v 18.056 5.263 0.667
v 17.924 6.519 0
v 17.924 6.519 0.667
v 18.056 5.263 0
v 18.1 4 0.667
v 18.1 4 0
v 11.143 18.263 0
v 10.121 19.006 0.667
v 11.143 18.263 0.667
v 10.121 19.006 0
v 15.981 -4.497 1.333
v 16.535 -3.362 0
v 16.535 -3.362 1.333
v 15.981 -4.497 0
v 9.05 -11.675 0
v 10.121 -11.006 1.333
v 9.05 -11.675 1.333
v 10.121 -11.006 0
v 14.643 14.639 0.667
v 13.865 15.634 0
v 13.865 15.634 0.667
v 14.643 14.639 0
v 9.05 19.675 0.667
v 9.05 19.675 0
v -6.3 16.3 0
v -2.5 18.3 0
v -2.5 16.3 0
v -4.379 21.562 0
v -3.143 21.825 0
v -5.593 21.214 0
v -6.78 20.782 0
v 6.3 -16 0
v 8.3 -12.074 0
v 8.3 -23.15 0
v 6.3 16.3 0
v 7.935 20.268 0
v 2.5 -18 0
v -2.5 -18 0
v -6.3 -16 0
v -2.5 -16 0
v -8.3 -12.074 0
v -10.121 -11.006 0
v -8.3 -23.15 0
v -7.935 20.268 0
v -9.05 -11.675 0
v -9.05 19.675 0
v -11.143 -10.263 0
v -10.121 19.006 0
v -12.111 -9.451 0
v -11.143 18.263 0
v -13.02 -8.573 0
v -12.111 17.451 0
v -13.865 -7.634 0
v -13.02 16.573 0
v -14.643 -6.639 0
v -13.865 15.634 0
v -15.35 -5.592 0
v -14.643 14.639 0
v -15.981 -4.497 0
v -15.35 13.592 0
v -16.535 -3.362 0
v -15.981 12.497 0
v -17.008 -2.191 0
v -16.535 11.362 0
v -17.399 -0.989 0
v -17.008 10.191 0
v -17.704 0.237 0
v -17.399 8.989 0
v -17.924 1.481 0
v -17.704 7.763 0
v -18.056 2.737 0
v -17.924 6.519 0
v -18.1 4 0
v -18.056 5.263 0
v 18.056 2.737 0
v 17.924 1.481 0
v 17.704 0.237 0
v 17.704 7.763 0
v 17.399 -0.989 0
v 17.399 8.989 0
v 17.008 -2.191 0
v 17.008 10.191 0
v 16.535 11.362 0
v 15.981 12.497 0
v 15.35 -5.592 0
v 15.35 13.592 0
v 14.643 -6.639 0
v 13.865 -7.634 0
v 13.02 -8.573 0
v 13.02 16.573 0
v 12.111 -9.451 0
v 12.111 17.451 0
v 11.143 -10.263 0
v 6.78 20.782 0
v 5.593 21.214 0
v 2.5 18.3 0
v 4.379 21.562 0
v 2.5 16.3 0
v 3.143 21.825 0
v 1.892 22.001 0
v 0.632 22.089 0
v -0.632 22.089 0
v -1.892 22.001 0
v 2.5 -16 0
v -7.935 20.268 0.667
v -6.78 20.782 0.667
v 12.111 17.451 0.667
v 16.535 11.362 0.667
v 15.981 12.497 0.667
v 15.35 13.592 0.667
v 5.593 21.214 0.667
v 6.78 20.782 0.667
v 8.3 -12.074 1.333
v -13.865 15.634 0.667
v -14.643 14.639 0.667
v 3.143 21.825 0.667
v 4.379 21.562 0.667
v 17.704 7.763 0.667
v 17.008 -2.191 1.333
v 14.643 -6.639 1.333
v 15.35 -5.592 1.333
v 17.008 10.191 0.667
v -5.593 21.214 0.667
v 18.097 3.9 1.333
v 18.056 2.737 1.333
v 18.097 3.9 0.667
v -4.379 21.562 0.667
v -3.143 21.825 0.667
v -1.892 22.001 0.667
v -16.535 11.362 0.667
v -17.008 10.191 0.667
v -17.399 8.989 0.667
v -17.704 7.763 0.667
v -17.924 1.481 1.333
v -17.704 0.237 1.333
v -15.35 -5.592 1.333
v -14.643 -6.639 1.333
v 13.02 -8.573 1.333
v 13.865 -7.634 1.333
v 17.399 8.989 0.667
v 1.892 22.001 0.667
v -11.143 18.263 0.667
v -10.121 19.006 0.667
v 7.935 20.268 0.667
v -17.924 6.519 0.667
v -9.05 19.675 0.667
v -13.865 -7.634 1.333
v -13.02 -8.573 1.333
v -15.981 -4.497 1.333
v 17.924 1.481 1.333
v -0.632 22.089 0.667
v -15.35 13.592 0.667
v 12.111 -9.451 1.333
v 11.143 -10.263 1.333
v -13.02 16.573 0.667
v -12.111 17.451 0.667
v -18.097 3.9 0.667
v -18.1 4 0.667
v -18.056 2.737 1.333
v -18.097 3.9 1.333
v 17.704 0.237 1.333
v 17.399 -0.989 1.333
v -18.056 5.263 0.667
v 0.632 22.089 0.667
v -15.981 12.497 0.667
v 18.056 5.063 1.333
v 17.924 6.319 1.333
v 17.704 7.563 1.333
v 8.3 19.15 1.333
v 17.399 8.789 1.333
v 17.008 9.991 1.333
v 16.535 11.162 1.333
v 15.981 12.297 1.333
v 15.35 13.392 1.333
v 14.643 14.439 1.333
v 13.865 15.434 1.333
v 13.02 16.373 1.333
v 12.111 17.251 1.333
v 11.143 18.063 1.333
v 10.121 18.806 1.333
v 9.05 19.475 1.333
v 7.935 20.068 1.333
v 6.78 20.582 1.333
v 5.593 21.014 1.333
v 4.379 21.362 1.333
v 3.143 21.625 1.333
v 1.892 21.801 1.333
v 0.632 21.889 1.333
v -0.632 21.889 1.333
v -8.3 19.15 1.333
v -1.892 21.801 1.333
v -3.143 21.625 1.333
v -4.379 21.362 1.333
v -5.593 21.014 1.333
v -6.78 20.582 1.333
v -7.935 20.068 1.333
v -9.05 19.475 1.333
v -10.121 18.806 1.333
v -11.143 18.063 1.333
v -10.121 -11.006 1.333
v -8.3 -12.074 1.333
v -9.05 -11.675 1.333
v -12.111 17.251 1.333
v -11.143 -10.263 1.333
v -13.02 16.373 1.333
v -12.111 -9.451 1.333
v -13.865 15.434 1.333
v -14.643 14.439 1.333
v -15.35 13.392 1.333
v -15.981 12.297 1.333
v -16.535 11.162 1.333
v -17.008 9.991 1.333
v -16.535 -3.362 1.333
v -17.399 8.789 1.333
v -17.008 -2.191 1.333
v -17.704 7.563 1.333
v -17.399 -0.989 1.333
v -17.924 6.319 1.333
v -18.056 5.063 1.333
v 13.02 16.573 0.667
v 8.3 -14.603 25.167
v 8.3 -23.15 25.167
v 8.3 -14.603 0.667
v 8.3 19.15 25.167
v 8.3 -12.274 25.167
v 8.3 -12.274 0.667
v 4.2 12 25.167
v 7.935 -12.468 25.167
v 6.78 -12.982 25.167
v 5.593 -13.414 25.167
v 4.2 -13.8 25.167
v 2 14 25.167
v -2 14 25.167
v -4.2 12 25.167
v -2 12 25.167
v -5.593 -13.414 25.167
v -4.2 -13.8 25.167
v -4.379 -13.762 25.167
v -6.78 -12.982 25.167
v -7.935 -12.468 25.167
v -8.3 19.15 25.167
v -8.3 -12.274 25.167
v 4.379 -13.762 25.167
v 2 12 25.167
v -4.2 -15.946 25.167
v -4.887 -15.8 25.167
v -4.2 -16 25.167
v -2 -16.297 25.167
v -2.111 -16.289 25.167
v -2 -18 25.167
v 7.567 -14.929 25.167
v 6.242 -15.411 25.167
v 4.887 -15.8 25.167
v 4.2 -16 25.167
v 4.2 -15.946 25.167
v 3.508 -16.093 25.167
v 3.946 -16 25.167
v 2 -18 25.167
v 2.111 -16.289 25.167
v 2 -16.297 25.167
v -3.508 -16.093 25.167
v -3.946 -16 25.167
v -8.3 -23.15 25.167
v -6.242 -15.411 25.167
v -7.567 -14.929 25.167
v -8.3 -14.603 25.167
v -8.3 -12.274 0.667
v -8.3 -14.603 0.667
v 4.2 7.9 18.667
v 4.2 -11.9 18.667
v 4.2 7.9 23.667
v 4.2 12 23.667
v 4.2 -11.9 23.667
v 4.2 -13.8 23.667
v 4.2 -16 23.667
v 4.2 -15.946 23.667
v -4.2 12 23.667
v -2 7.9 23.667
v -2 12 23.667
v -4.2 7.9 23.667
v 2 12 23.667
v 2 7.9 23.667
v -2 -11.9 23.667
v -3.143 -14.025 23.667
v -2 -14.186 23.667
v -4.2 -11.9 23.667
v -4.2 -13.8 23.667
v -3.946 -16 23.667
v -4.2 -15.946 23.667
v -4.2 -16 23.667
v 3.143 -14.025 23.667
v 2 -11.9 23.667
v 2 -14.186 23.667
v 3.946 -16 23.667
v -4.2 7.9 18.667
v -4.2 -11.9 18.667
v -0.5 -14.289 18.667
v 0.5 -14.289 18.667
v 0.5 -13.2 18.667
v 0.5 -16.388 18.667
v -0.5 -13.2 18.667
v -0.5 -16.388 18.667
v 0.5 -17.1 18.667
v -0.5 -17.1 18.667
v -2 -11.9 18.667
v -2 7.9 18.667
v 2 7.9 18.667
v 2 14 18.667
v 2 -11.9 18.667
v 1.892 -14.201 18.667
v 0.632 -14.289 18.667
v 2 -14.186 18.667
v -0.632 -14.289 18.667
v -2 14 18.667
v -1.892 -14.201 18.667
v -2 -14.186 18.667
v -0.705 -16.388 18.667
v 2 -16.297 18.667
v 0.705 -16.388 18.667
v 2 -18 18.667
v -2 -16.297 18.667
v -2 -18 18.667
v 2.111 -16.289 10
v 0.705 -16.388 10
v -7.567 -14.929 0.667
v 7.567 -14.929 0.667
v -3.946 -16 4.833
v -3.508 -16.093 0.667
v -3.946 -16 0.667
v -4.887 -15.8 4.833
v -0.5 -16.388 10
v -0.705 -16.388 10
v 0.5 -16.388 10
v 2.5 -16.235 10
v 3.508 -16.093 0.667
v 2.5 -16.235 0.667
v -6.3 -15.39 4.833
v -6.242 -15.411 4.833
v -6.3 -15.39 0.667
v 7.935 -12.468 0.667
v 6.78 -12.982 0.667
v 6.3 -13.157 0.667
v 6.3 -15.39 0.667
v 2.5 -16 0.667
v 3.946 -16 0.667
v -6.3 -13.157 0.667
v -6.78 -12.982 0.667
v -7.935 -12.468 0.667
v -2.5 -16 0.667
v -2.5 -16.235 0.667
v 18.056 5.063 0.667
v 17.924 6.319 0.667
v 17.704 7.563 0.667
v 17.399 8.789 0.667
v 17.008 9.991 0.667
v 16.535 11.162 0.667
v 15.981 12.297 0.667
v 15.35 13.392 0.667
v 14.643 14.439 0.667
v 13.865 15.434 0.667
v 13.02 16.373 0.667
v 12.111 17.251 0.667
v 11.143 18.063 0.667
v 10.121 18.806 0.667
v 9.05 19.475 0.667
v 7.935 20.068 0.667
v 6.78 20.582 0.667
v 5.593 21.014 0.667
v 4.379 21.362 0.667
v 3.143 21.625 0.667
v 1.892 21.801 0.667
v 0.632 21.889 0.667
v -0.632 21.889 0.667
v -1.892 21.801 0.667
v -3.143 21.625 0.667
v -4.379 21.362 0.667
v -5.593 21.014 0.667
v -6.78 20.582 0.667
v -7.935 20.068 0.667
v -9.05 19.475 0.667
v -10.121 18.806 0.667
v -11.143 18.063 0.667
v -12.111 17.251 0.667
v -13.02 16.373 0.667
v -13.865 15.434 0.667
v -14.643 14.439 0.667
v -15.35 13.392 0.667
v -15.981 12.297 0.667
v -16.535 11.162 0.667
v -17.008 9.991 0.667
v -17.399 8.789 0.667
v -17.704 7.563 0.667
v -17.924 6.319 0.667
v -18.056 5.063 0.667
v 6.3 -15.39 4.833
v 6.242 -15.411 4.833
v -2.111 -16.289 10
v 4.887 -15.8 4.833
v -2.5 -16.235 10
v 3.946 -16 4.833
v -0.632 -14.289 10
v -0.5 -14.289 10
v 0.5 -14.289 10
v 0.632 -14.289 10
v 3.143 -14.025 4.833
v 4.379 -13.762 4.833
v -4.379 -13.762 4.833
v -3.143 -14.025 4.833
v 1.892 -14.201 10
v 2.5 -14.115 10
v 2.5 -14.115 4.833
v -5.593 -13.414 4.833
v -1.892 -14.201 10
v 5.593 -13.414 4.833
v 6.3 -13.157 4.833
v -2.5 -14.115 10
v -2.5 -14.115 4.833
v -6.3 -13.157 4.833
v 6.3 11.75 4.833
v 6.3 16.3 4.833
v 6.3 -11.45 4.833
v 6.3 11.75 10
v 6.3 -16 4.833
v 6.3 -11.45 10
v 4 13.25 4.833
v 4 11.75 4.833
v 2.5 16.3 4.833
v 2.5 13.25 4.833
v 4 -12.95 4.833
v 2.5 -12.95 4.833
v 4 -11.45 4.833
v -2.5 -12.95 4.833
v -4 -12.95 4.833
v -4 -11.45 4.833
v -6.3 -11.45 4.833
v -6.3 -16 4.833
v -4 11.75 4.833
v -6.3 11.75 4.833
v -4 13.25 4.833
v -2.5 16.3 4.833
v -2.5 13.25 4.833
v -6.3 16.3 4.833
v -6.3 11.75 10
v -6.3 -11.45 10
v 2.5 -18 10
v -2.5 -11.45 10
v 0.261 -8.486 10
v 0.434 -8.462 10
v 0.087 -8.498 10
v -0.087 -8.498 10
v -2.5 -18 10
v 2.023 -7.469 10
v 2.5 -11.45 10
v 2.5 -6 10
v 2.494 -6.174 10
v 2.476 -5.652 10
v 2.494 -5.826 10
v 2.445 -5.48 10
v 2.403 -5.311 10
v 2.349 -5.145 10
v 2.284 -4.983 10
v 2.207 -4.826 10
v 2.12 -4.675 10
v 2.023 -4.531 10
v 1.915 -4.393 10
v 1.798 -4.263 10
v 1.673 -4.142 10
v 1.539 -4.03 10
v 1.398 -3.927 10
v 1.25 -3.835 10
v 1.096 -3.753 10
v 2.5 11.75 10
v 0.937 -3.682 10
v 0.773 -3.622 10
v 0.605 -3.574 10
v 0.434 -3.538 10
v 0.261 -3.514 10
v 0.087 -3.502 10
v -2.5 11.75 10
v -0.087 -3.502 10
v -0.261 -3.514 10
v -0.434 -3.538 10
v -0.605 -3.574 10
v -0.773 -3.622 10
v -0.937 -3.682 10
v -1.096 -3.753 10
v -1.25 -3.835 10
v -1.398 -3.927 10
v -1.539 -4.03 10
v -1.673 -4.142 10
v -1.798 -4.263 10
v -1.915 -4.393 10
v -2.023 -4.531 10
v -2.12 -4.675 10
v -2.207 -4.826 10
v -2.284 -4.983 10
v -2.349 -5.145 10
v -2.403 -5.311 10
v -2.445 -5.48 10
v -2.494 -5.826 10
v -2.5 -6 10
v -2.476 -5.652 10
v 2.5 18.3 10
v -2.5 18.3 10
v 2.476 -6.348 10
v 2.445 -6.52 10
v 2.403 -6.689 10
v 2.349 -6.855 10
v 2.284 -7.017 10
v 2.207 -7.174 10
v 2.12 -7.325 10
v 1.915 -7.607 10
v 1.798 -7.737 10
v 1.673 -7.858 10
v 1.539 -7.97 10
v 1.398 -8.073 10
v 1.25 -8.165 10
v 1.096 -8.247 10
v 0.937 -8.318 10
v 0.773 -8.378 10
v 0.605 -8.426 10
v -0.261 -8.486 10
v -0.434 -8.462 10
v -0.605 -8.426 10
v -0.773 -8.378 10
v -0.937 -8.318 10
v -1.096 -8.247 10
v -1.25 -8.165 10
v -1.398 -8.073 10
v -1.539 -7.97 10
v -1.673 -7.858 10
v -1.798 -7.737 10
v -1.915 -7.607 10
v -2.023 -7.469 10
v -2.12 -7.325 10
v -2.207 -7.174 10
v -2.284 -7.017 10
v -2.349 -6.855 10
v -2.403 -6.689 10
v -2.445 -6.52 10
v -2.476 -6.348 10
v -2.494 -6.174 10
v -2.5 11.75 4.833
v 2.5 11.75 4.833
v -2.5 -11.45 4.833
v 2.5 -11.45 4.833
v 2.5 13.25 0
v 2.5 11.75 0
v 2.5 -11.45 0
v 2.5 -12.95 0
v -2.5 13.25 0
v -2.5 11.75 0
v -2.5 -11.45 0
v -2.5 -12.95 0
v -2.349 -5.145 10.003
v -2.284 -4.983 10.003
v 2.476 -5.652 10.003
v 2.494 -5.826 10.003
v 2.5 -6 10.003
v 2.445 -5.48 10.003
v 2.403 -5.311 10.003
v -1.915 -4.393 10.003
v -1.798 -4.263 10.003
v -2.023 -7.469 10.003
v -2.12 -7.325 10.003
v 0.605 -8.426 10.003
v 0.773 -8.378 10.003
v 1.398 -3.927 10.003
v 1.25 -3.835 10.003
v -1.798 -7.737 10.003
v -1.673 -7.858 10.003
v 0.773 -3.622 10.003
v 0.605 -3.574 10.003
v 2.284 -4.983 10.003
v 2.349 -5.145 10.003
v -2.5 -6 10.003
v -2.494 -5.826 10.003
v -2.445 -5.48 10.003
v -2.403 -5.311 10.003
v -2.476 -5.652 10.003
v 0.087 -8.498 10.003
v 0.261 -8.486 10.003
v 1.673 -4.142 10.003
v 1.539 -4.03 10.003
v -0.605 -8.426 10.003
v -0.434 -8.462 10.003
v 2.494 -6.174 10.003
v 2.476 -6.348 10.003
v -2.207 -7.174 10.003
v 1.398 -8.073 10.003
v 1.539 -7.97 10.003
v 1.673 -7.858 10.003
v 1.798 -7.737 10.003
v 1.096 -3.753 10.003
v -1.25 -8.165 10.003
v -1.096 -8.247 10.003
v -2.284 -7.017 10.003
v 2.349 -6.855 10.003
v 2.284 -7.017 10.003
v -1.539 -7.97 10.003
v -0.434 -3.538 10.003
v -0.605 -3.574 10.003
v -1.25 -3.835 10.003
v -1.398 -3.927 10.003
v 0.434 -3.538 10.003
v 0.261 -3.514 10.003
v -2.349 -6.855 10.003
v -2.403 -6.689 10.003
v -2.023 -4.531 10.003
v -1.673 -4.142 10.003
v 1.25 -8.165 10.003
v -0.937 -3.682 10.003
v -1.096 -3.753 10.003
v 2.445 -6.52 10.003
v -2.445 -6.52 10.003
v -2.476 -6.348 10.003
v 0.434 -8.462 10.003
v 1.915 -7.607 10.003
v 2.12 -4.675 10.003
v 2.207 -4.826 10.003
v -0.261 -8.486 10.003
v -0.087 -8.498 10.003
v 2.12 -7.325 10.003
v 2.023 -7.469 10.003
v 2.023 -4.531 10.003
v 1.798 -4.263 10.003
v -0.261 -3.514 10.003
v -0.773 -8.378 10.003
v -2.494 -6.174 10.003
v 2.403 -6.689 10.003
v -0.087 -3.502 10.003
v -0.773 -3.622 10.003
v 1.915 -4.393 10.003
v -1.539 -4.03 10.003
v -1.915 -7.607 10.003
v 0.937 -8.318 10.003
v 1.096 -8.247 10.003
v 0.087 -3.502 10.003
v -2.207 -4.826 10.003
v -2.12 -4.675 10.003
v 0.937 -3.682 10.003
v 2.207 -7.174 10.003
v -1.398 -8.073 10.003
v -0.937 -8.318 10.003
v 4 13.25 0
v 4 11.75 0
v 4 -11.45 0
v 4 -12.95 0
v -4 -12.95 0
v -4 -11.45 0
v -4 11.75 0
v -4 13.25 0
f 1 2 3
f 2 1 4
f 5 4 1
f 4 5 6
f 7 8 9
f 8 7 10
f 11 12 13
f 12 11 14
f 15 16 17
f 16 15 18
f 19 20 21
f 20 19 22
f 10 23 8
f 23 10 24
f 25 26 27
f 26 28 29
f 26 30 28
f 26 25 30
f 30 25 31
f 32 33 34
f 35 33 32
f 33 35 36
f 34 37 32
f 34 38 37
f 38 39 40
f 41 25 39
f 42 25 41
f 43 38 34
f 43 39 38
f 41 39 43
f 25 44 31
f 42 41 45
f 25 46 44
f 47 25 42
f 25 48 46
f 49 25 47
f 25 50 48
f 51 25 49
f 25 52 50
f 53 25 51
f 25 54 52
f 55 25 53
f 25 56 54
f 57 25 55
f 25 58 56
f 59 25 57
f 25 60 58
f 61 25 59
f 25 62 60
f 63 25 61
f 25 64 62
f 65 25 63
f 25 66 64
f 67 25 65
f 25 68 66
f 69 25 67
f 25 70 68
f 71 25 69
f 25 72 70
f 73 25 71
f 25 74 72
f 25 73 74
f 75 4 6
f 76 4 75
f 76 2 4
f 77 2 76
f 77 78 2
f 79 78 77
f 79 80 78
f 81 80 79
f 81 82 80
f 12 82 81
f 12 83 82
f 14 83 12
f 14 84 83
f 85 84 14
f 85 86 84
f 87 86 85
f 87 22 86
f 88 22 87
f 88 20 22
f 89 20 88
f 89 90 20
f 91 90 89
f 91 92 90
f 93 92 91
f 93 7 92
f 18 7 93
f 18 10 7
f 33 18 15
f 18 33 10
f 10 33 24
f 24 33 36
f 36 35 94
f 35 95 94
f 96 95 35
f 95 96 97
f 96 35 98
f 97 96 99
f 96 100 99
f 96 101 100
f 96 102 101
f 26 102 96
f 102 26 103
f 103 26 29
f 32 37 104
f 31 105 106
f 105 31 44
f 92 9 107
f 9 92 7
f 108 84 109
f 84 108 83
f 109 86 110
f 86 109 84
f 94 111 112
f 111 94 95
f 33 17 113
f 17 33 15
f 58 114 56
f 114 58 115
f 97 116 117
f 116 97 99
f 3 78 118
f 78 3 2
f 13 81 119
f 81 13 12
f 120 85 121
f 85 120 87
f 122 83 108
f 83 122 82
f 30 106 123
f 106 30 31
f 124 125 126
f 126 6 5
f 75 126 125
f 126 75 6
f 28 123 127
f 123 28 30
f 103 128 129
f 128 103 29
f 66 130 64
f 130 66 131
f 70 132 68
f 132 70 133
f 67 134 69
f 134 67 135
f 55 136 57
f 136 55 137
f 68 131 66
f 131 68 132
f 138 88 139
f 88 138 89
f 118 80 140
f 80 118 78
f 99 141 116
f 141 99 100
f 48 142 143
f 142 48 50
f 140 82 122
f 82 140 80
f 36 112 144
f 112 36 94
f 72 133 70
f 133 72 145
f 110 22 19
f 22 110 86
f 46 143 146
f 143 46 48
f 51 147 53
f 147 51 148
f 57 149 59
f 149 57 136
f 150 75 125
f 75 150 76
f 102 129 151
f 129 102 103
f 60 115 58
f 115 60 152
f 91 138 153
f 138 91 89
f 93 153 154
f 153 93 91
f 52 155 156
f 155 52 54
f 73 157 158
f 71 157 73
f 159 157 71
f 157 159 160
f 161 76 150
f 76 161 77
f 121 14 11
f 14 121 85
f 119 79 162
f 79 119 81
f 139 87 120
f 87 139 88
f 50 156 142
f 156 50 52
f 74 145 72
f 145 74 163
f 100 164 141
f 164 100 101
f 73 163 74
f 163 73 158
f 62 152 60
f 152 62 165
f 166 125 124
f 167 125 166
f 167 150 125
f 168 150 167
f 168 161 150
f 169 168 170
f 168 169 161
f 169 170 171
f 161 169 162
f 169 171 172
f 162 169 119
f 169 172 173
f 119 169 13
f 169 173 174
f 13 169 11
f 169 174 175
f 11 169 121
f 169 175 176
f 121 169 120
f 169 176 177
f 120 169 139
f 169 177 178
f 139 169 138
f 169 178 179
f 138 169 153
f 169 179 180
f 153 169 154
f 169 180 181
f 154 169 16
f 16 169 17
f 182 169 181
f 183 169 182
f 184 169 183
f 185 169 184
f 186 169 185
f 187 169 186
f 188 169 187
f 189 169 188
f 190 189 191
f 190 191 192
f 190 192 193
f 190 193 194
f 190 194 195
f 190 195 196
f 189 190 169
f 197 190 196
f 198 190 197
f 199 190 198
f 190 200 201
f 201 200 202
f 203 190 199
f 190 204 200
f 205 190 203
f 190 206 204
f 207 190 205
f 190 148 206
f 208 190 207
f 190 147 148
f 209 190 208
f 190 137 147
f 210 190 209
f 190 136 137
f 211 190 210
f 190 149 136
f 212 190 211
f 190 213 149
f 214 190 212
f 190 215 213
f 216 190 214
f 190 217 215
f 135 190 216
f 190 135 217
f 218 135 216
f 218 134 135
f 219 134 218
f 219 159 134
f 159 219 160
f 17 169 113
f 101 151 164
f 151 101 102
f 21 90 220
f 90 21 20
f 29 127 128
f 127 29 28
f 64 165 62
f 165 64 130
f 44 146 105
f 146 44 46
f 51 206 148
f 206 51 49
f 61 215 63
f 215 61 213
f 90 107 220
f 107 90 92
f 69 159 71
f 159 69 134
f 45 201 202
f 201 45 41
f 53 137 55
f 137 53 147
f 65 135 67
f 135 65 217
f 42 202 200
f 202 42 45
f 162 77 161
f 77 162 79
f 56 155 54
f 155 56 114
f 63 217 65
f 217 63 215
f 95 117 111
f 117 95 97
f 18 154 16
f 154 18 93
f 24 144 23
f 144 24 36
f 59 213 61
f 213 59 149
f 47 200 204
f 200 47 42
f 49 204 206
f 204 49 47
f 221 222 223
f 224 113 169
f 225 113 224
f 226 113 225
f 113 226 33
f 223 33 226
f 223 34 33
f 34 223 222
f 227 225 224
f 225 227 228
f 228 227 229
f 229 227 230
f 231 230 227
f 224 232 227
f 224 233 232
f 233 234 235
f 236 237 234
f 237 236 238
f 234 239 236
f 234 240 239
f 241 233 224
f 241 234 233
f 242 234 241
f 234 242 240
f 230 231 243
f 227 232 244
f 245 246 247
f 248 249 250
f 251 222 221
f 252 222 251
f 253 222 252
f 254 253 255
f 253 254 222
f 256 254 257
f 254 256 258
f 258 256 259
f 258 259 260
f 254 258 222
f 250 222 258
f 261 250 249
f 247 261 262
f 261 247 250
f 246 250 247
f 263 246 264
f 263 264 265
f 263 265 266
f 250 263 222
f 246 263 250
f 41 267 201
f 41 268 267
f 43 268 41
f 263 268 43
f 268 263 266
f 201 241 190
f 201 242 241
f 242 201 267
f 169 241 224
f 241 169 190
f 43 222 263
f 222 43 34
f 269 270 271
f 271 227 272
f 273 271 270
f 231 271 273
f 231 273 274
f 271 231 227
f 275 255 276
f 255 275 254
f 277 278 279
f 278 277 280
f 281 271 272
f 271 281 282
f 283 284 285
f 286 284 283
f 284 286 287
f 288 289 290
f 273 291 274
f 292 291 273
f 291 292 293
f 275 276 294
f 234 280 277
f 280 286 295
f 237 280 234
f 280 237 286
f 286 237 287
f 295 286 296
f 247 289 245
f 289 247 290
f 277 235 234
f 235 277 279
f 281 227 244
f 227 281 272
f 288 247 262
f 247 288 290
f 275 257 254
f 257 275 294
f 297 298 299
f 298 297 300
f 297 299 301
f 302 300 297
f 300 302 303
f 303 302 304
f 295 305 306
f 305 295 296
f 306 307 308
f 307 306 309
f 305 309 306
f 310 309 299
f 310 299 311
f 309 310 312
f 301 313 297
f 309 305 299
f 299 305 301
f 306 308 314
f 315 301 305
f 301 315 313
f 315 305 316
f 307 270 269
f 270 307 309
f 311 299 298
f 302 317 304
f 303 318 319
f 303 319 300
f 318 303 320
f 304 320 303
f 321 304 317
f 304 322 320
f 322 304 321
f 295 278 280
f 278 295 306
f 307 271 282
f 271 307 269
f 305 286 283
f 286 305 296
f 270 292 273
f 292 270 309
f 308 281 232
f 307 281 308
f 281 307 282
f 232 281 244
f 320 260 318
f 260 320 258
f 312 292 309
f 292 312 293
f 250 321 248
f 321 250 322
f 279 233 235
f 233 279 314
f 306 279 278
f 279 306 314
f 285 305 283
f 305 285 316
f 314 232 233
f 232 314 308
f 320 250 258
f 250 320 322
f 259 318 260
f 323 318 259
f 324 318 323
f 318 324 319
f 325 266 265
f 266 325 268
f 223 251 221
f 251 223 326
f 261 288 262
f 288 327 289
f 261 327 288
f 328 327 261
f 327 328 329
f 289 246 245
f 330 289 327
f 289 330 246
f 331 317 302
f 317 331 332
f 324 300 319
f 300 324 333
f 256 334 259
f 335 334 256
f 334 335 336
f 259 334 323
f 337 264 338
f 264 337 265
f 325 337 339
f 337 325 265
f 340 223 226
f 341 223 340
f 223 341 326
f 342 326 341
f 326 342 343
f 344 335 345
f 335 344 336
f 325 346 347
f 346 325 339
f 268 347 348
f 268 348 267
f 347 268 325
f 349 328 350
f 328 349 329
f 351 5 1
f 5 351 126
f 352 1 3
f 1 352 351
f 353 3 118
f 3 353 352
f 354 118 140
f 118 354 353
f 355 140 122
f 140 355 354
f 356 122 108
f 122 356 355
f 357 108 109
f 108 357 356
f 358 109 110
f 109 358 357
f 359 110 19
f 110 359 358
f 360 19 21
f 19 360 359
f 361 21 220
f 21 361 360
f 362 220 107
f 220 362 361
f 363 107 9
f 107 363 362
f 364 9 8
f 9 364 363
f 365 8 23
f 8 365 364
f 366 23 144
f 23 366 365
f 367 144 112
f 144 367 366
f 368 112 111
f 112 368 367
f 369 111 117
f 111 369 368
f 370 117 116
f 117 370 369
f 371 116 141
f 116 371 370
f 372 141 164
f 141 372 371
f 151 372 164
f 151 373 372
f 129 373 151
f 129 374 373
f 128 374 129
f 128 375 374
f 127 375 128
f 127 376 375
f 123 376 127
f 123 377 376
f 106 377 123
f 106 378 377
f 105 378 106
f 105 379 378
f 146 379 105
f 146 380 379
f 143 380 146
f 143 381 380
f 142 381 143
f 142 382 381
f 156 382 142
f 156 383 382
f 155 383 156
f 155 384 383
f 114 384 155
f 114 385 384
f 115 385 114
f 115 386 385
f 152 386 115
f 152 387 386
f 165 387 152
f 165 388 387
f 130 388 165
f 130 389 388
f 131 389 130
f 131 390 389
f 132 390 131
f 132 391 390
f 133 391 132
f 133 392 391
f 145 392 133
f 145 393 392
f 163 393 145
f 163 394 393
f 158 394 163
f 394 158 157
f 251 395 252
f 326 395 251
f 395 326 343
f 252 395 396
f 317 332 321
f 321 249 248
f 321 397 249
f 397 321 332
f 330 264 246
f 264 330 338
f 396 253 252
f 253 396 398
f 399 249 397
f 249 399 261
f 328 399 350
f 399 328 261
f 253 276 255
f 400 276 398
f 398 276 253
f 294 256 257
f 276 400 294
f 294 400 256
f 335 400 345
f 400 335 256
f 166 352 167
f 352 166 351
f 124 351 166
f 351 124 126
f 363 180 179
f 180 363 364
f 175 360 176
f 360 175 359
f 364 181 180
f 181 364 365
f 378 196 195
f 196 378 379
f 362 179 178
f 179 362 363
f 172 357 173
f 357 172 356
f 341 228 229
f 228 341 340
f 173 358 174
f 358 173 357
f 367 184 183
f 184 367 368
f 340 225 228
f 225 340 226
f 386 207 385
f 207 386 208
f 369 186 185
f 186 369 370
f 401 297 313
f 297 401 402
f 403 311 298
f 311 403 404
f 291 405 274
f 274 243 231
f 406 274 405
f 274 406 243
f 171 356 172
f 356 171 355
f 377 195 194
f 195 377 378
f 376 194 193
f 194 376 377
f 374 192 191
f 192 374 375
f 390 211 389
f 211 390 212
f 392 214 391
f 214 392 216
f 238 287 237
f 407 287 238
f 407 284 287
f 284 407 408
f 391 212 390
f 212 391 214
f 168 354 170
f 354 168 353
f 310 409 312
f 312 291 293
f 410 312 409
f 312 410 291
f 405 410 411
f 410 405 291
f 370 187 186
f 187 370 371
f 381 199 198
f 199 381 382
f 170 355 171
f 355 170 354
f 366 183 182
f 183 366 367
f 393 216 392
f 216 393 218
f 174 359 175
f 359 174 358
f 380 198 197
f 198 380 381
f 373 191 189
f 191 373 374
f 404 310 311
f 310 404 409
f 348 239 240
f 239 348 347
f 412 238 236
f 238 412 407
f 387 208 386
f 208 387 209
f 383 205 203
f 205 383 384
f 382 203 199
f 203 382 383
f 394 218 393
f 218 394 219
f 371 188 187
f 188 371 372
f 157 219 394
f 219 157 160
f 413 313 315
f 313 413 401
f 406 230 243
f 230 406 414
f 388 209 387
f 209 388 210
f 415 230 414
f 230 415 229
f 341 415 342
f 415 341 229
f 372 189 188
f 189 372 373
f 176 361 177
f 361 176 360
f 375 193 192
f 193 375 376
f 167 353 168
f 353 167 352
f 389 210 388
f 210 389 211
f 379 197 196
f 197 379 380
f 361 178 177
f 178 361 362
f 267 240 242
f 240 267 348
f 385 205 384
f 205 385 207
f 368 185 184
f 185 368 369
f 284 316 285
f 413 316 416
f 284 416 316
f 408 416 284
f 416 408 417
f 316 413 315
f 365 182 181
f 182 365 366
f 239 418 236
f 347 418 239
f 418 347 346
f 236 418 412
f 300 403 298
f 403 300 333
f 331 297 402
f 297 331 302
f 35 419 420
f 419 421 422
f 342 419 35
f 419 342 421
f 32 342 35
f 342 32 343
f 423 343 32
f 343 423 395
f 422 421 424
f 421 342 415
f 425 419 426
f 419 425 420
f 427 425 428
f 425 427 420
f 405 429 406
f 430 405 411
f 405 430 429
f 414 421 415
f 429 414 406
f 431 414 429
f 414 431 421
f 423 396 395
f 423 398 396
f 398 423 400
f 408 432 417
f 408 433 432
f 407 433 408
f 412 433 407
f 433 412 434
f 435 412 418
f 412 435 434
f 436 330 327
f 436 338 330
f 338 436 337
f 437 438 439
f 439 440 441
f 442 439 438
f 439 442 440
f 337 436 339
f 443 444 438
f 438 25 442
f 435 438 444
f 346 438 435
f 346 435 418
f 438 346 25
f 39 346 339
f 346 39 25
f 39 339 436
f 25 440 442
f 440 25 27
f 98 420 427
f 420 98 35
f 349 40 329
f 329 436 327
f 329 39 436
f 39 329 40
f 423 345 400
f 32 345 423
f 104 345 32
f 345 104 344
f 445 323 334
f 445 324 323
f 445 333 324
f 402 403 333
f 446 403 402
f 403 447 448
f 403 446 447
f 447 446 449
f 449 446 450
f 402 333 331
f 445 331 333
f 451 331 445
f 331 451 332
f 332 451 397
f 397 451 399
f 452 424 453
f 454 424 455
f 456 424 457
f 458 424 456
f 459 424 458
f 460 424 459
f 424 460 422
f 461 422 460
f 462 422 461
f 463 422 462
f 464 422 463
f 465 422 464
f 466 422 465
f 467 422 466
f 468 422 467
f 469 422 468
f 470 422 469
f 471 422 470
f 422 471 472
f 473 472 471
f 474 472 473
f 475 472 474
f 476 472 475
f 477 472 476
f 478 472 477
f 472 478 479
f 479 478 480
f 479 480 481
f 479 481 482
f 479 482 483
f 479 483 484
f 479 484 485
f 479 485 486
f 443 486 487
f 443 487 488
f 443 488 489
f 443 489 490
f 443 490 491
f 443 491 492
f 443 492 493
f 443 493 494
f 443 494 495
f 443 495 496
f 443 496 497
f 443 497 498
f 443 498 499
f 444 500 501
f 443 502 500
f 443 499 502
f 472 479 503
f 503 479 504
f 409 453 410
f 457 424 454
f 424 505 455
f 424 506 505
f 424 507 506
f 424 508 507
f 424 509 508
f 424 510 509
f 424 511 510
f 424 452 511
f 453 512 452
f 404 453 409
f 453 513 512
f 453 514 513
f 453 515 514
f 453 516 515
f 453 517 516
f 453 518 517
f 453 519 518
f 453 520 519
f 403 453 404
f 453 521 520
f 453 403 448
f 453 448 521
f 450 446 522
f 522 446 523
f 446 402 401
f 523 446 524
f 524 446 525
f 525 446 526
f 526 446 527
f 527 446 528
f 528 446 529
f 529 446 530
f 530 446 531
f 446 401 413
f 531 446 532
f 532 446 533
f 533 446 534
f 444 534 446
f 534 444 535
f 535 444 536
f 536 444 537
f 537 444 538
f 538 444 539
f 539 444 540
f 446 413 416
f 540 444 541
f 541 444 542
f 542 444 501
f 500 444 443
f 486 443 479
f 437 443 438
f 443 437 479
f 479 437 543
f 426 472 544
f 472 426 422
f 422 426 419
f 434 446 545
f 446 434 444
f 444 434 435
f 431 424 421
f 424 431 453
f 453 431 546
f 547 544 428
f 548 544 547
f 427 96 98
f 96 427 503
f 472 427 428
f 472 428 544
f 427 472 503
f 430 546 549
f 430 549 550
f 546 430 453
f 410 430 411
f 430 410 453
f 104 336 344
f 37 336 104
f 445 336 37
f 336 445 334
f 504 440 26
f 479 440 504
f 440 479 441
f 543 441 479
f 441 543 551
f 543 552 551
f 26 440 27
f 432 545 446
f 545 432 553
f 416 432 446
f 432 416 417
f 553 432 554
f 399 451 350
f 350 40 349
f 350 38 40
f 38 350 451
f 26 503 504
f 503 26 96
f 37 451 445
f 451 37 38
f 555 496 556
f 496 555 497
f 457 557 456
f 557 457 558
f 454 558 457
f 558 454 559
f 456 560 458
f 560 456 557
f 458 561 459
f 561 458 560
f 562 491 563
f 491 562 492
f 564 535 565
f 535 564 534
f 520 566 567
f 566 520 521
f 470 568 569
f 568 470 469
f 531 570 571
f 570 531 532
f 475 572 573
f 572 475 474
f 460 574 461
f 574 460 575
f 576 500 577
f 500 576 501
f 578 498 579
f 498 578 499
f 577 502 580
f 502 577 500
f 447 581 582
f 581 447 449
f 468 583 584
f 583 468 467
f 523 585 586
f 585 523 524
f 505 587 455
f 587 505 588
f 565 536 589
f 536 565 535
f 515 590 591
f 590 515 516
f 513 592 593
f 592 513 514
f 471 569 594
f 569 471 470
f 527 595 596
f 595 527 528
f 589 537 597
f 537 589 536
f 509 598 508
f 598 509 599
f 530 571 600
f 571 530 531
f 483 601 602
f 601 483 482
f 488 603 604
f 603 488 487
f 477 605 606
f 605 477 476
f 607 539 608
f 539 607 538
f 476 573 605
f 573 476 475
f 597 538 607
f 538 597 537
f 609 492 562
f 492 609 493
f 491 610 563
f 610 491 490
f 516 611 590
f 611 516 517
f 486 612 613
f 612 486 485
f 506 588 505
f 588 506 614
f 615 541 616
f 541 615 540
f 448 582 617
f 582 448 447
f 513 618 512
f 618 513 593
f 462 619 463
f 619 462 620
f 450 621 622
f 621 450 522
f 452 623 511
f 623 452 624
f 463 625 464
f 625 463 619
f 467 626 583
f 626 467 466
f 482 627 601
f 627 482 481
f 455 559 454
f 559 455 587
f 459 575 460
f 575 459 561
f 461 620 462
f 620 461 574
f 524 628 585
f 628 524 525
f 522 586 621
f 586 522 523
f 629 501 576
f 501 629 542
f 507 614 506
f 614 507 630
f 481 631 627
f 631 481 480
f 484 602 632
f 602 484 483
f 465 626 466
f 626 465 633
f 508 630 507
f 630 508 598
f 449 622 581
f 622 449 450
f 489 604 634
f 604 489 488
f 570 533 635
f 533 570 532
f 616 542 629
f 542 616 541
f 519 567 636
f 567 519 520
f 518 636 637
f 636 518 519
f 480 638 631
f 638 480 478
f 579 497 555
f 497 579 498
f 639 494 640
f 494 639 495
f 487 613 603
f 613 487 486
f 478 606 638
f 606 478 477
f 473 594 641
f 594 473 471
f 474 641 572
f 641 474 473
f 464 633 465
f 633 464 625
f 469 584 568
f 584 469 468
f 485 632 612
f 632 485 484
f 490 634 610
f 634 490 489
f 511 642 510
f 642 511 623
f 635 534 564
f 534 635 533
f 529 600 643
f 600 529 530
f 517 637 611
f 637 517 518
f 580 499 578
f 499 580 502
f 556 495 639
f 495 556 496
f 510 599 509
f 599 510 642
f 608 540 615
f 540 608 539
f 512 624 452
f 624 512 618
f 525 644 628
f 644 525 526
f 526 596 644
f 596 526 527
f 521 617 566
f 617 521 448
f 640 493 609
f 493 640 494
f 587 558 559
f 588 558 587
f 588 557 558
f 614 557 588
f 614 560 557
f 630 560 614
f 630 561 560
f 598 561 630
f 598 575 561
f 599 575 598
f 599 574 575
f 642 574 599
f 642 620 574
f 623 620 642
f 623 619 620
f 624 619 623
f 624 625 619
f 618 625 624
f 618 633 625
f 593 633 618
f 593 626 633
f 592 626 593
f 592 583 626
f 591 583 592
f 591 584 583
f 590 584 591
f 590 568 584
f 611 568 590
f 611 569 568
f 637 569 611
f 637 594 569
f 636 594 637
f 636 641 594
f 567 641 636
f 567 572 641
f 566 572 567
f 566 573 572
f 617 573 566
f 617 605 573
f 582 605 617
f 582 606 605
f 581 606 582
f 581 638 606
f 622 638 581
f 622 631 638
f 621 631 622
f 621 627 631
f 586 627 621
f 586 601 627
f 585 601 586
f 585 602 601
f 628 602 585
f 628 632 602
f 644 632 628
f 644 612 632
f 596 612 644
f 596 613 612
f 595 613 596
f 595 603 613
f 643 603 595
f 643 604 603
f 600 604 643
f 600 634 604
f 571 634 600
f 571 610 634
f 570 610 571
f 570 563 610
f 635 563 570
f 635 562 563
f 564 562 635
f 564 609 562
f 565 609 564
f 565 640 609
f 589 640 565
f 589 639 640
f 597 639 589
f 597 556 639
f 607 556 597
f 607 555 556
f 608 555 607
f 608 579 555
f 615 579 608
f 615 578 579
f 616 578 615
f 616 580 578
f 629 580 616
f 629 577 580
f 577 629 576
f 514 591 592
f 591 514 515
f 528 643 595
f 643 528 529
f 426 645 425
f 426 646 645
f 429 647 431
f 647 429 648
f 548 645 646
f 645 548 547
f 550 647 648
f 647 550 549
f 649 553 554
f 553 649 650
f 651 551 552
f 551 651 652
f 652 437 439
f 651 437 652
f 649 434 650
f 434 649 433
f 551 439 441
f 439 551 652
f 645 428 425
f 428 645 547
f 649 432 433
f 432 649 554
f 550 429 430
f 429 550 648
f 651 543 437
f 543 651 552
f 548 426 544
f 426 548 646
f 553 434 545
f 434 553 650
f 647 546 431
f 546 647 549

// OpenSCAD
$fn=90;
CROSS_CUT = false;

Z_SHRINK_FACTOR = 3;

TABS = [
    // top plate
    [1, 2, 3, 3, 2, 4, 4, 3, 1, 1],

    // middle plate
    [1, 2, 3, 3, 3, 3, 3, 2, 3, 3],

    // bottom plate
    [1, 2, 3, 4, 2, 4, 1, 2, 1, 2],
];

F = 0.5;
F = 1;

APART = false;

PLAY = 0.4;

ROTATION_STEP = 15; // degree

ENCODER_RADIUS = 20 - PLAY/2;

ENCODER_HEIGHT = 80 *F;
ENCODER_THICKNESS = 1.5 - PLAY/2;

ENCODER_ROTATION = -ROTATION_STEP * 10 * abs(sin($t*360));
//ENCODER_ROTATION = -ROTATION_STEP * 0;

TAB_VSIZE = 4 *F;
TAB_HSIZE = 3.5;
TAB_SPACING = 4.5 *F;

BODY_RADIUS = 25;
BODY_THICKNESS = 1;
BODY_WINDOW_MARGIN = 2;
BODY_MARGIN = 2;
BODY_GUIDE = 2; // <== TODO: Snapping ring
BODY_HEIGHT = ENCODER_HEIGHT + BODY_MARGIN;

SERVO1_HEIGHT = 26;
SERVO1_BODY_HEIGHT = 20;
SERVO1_BODY_WIDTH = 28;
SERVO1_BODY_WIDTH_CLEARANCE = 0; //2;
SERVO1_BODY_THICKNESS = 8.4;
SERVO1_BODY_THICKNESS_CLEARANCE = 4;
SERVO1_AXIS_SHIFT = 8 - SERVO1_BODY_WIDTH/2;
SERVO1_AXIS_RADIUS = 1.95;
SERVO1_CLEARANCE = 6.5;
SERVO1_HOLDER_HEIGHT = BODY_HEIGHT - SERVO1_CLEARANCE;
SERVO1_HOLDER_THICKNESS = 2;
SERVO1_BOTTOM_BODY_HEIGHT = 15;
SERVO1_BOTTOM_BODY_WIDTH = 19.8;

SERVO2_HEIGHT = 30;
SERVO2_BODY_HEIGHT = 22.5;
SERVO2_BODY_WIDTH = 32.3;
SERVO2_BODY_WIDTH_CLEARANCE = 0;
SERVO2_BODY_THICKNESS = 12.6;
SERVO2_BODY_THICKNESS_CLEARANCE = 5;
SERVO2_AXIS_SHIFT = SERVO2_BODY_WIDTH/2 -10;
SERVO2_AXIS_RADIUS = 2.5;
SERVO2_CLEARANCE = 12.5;
SERVO2_HOLDER_HEIGHT = BODY_HEIGHT - SERVO2_CLEARANCE;
SERVO2_HOLDER_THICKNESS = 2;
SERVO2_DISPLACEMENT = -7+1;
SERVO2_BOTTOM_BODY_HEIGHT = 15.5;
SERVO2_BOTTOM_BODY_WIDTH = 23.2;

ENCODER_DISPLACEMENT = BODY_RADIUS-ENCODER_RADIUS-BODY_THICKNESS -PLAY/2;

SUPPORT_THICKNESS = 1.5;

ATOM = 0.01;


module body_encoder_cavity() {
    translate([0, ENCODER_DISPLACEMENT, BODY_MARGIN])
    scale([1, 1, BODY_HEIGHT])
    cylinder(r=ENCODER_RADIUS+PLAY, h=1, true);
}

module body_window() {
    translate([0, 0, BODY_WINDOW_MARGIN + BODY_MARGIN])
    scale([1, 1, ENCODER_HEIGHT-BODY_WINDOW_MARGIN*2])
    translate([0, BODY_RADIUS, 0])
    cylinder(r=TAB_HSIZE/1.5, h=1, true);
}

module body_servo_holder() {
    translate([0, ENCODER_DISPLACEMENT, 0])
    servo_holder(max(SERVO1_BODY_WIDTH, SERVO2_BODY_WIDTH),
                 max(SERVO1_BODY_THICKNESS, SERVO2_BODY_THICKNESS));
}

module body_servo1_cavity() {
    translate([0, ENCODER_DISPLACEMENT, BODY_HEIGHT - SERVO1_HEIGHT]) {
        servo1_hull();
        servo1_hull2(BODY_HEIGHT);
    }
}

module body_encoder_border_cavity() {
    translate([0, ENCODER_DISPLACEMENT - PLAY/2, BODY_MARGIN])
    scale([1, 1, BODY_HEIGHT])
    difference() {
        cylinder(r=ENCODER_RADIUS+PLAY, h=1, true);
        cylinder(r=ENCODER_RADIUS-ENCODER_THICKNESS-PLAY, h=1, true);
    }
}

module body_spine() {
    spine_width = ENCODER_THICKNESS*3;
    if(1)
    translate([0, -ENCODER_RADIUS + ENCODER_DISPLACEMENT + ENCODER_THICKNESS/2, 0])
    scale([1, spine_width , BODY_HEIGHT - SERVO1_HEIGHT])
    translate([0, 0, 0.5])
    cube(1, true);                
}

module body_servo2_cavity() {
    translate([0, SERVO2_DISPLACEMENT, 0]) {
        servo2_hull();
    }        
}

module body_servo2_pillars() {
    translate([0, SERVO2_DISPLACEMENT, 0]) {
        servo2_pillars();
    }        
}

module body() {
    difference() {
        union() {
            difference() {
                union() {
                    %
                    difference() {
                        // body
                        scale([1, 1, BODY_HEIGHT])
                        cylinder(r=BODY_RADIUS, h=1, true);

                        body_encoder_cavity();
                        body_window();
                    }
                    body_servo_holder();
                }
                body_servo1_cavity();
                body_encoder_border_cavity();
            }
            body_spine();
        }
        body_servo2_cavity();
    }
    body_servo2_pillars();
}


module encoder() {
    rotate([0, 0, ENCODER_ROTATION])
    difference() {
        // body
        scale([1, 1, ENCODER_HEIGHT - PLAY])
        cylinder(r=ENCODER_RADIUS, h=1, true);

        // cavity
        encoder_cavity();

        // servo axis
        translate([0, 0, ENCODER_HEIGHT - SERVO1_HEIGHT])
        servo1_hull();

        // codes
        for (i=[0:9]) {
            top = TABS[0][i]+1;
            mid = TABS[1][i]+1;
            bot = TABS[2][i]+1;

            rotate([0, 0, 90 + ROTATION_STEP*i]) {
                translate([ENCODER_RADIUS, 0, ENCODER_HEIGHT/6*5 + TAB_SPACING*(top-3)])
                cube([TAB_HSIZE, TAB_HSIZE, TAB_VSIZE], true);

                translate([ENCODER_RADIUS, 0, ENCODER_HEIGHT/6*3 + TAB_SPACING*(mid-4)])
                cube([TAB_HSIZE, TAB_HSIZE, TAB_VSIZE], true);

                translate([ENCODER_RADIUS, 0, ENCODER_HEIGHT/6*1 + TAB_SPACING*(bot-4)])
                cube([TAB_HSIZE, TAB_HSIZE, TAB_VSIZE], true);
            }
        }
    }

}


module encoder_cavity() {
    // remove center
    translate([0, 0, -ATOM])
    scale([1, 1, ENCODER_HEIGHT-ENCODER_THICKNESS + ATOM*2])
    cylinder(r=ENCODER_RADIUS-ENCODER_THICKNESS, h=1, true);

    // remove quarter 1
    rotate([0, 0, -ROTATION_STEP*1.5])
    translate([0, -ATOM, -ATOM])
    scale([ENCODER_RADIUS*2, ENCODER_RADIUS*2+ATOM, ENCODER_HEIGHT-ENCODER_THICKNESS+ATOM*2])
    cube(1);

    // remove quarter 2
    rotate([0, 0, -ROTATION_STEP*7.5])
    translate([0, 0, -ATOM])
    scale([ENCODER_RADIUS*2, ENCODER_RADIUS*2, ENCODER_HEIGHT-ENCODER_THICKNESS+ATOM*2])
    cube(1);
}

module servo_holder(width, thickness) {
    union() {
        // guiding disc
        scale([1, 1, BODY_GUIDE + BODY_MARGIN])
        cylinder(r=ENCODER_RADIUS-ENCODER_THICKNESS - PLAY, h=1, true);

        // central column
        translate([0, SERVO1_AXIS_SHIFT, SERVO1_HOLDER_HEIGHT/2])
        cube([thickness + SERVO1_HOLDER_THICKNESS*2,
              width + SERVO1_HOLDER_THICKNESS*5,
              SERVO1_HOLDER_HEIGHT], true);
    }
}


module servo1_hull() {
    servo_hull(SERVO1_AXIS_RADIUS,
               SERVO1_AXIS_SHIFT,
               SERVO1_BODY_HEIGHT,
               SERVO1_BODY_THICKNESS, SERVO1_BODY_THICKNESS_CLEARANCE,
               SERVO1_BODY_WIDTH, SERVO1_BODY_WIDTH_CLEARANCE,
               SERVO1_BOTTOM_BODY_HEIGHT,
               SERVO1_BOTTOM_BODY_WIDTH,
               SERVO1_HEIGHT,
               SERVO1_HOLDER_THICKNESS,
               false);
}

module servo1_hull2(extent) {
    servo_hull2(extent,
                SERVO1_AXIS_SHIFT,
                SERVO1_BODY_THICKNESS,
                SERVO1_BODY_WIDTH);
}

module servo2_hull() {
    servo_hull(SERVO2_AXIS_RADIUS,
               SERVO2_AXIS_SHIFT,
               SERVO2_HEIGHT,
               SERVO2_BODY_THICKNESS, SERVO2_BODY_THICKNESS_CLEARANCE,
               SERVO2_BODY_WIDTH, SERVO2_BODY_WIDTH_CLEARANCE,
               SERVO2_BOTTOM_BODY_HEIGHT,
               SERVO2_BOTTOM_BODY_WIDTH,
               SERVO2_HEIGHT,
               SERVO2_HOLDER_THICKNESS,
               true);
}

module servo2_pillars() {
    servo_pillars(SERVO2_AXIS_RADIUS,
                  SERVO2_AXIS_SHIFT,
                  SERVO2_HEIGHT,
                  SERVO2_BODY_THICKNESS, SERVO2_BODY_THICKNESS_CLEARANCE,
                  SERVO2_BODY_WIDTH, SERVO2_BODY_WIDTH_CLEARANCE,
                  SERVO2_BOTTOM_BODY_HEIGHT,
                  SERVO2_BOTTOM_BODY_WIDTH,
                  SERVO2_HEIGHT,
                  SERVO2_HOLDER_THICKNESS);
}


module servo_hull(servo_axis_radius,
                  servo_axis_shift,
                  servo_body_height,
                  servo_body_thickness,
                  servo_body_thickness_clearance,
                  servo_body_width,
                  servo_body_width_clearance,
                  servo_bottom_body_height,
                  servo_bottom_body_width,
                  servo_height,
                  servo_holder_thickness,
                  upside_down)
{
    // body
    delta_h = servo_body_height - servo_bottom_body_height;

    translate([0, servo_axis_shift,
               upside_down ? delta_h/2 : delta_h/2 + servo_bottom_body_height])
    cube([servo_body_thickness, servo_body_width, delta_h], true);

    translate([0, servo_axis_shift,
               upside_down ? servo_height - servo_bottom_body_height/2 : servo_bottom_body_height/2])
    cube([servo_body_thickness, servo_bottom_body_width, servo_bottom_body_height], true);

    // clearances
    translate([0, servo_axis_shift, servo_height/2])
    cube([servo_body_thickness+servo_holder_thickness*5,
          servo_body_width_clearance,
          servo_height], true);
    translate([0, servo_axis_shift, servo_height/2])
    cube([servo_body_thickness_clearance,
          servo_body_width + servo_holder_thickness*2,
          servo_height], true);

    // axis
    scale([1, 1, servo_height + ATOM])
    cylinder(r=servo_axis_radius, h=1);
}


module servo_pillars(servo_axis_radius,
                     servo_axis_shift,
                     servo_body_height,
                     servo_body_thickness,
                     servo_body_thickness_clearance,
                     servo_body_width,
                     servo_body_width_clearance,
                     servo_bottom_body_height,
                     servo_bottom_body_width,
                     servo_height,
                     servo_holder_thickness)
{
    // body
    delta_h = servo_body_height - servo_bottom_body_height;

    difference() {
        // support pillar
        translate([0, servo_axis_shift, delta_h/2])        
        difference() {
            cube([servo_body_thickness_clearance+SUPPORT_THICKNESS*2, 
                  servo_bottom_body_width+SUPPORT_THICKNESS*2, delta_h], true);
            cube([servo_body_thickness, servo_bottom_body_width, delta_h], true);
        }

        // clearance
        translate([0, servo_axis_shift, servo_height/2])
        cube([servo_body_thickness_clearance,
              servo_body_width + servo_holder_thickness*2,
              servo_height], true);
    }
}


module servo_hull2(extent,
                   servo_axis_shift,
                   servo_body_thickness,
                   servo_body_width,
                   ) {
                       if(0)
    translate([0, servo_axis_shift, extent/2])
    cube([servo_body_thickness, servo_body_width, extent], true);
}


module move_apart(upside_down, displacement, elevation) {
    translate([0, APART ? displacement : 0, APART ? elevation : 0])
    rotate([upside_down && APART ? 180 : 0, 0, 0])
    children();
    }

module all() {
    body();

    if(0)
    move_apart(true, 70, ENCODER_HEIGHT + BODY_MARGIN - PLAY)
    translate([0, ENCODER_DISPLACEMENT, BODY_MARGIN])
    encoder();
}



scale([1, 1, 1/Z_SHRINK_FACTOR])
{
    intersection() {
        all();

        if(CROSS_CUT)
            scale(200)
            translate([0.5, 0, 0])
            cube(1, true);
    }

    if(0) color("yellow") body_servo2_cavity();
}
